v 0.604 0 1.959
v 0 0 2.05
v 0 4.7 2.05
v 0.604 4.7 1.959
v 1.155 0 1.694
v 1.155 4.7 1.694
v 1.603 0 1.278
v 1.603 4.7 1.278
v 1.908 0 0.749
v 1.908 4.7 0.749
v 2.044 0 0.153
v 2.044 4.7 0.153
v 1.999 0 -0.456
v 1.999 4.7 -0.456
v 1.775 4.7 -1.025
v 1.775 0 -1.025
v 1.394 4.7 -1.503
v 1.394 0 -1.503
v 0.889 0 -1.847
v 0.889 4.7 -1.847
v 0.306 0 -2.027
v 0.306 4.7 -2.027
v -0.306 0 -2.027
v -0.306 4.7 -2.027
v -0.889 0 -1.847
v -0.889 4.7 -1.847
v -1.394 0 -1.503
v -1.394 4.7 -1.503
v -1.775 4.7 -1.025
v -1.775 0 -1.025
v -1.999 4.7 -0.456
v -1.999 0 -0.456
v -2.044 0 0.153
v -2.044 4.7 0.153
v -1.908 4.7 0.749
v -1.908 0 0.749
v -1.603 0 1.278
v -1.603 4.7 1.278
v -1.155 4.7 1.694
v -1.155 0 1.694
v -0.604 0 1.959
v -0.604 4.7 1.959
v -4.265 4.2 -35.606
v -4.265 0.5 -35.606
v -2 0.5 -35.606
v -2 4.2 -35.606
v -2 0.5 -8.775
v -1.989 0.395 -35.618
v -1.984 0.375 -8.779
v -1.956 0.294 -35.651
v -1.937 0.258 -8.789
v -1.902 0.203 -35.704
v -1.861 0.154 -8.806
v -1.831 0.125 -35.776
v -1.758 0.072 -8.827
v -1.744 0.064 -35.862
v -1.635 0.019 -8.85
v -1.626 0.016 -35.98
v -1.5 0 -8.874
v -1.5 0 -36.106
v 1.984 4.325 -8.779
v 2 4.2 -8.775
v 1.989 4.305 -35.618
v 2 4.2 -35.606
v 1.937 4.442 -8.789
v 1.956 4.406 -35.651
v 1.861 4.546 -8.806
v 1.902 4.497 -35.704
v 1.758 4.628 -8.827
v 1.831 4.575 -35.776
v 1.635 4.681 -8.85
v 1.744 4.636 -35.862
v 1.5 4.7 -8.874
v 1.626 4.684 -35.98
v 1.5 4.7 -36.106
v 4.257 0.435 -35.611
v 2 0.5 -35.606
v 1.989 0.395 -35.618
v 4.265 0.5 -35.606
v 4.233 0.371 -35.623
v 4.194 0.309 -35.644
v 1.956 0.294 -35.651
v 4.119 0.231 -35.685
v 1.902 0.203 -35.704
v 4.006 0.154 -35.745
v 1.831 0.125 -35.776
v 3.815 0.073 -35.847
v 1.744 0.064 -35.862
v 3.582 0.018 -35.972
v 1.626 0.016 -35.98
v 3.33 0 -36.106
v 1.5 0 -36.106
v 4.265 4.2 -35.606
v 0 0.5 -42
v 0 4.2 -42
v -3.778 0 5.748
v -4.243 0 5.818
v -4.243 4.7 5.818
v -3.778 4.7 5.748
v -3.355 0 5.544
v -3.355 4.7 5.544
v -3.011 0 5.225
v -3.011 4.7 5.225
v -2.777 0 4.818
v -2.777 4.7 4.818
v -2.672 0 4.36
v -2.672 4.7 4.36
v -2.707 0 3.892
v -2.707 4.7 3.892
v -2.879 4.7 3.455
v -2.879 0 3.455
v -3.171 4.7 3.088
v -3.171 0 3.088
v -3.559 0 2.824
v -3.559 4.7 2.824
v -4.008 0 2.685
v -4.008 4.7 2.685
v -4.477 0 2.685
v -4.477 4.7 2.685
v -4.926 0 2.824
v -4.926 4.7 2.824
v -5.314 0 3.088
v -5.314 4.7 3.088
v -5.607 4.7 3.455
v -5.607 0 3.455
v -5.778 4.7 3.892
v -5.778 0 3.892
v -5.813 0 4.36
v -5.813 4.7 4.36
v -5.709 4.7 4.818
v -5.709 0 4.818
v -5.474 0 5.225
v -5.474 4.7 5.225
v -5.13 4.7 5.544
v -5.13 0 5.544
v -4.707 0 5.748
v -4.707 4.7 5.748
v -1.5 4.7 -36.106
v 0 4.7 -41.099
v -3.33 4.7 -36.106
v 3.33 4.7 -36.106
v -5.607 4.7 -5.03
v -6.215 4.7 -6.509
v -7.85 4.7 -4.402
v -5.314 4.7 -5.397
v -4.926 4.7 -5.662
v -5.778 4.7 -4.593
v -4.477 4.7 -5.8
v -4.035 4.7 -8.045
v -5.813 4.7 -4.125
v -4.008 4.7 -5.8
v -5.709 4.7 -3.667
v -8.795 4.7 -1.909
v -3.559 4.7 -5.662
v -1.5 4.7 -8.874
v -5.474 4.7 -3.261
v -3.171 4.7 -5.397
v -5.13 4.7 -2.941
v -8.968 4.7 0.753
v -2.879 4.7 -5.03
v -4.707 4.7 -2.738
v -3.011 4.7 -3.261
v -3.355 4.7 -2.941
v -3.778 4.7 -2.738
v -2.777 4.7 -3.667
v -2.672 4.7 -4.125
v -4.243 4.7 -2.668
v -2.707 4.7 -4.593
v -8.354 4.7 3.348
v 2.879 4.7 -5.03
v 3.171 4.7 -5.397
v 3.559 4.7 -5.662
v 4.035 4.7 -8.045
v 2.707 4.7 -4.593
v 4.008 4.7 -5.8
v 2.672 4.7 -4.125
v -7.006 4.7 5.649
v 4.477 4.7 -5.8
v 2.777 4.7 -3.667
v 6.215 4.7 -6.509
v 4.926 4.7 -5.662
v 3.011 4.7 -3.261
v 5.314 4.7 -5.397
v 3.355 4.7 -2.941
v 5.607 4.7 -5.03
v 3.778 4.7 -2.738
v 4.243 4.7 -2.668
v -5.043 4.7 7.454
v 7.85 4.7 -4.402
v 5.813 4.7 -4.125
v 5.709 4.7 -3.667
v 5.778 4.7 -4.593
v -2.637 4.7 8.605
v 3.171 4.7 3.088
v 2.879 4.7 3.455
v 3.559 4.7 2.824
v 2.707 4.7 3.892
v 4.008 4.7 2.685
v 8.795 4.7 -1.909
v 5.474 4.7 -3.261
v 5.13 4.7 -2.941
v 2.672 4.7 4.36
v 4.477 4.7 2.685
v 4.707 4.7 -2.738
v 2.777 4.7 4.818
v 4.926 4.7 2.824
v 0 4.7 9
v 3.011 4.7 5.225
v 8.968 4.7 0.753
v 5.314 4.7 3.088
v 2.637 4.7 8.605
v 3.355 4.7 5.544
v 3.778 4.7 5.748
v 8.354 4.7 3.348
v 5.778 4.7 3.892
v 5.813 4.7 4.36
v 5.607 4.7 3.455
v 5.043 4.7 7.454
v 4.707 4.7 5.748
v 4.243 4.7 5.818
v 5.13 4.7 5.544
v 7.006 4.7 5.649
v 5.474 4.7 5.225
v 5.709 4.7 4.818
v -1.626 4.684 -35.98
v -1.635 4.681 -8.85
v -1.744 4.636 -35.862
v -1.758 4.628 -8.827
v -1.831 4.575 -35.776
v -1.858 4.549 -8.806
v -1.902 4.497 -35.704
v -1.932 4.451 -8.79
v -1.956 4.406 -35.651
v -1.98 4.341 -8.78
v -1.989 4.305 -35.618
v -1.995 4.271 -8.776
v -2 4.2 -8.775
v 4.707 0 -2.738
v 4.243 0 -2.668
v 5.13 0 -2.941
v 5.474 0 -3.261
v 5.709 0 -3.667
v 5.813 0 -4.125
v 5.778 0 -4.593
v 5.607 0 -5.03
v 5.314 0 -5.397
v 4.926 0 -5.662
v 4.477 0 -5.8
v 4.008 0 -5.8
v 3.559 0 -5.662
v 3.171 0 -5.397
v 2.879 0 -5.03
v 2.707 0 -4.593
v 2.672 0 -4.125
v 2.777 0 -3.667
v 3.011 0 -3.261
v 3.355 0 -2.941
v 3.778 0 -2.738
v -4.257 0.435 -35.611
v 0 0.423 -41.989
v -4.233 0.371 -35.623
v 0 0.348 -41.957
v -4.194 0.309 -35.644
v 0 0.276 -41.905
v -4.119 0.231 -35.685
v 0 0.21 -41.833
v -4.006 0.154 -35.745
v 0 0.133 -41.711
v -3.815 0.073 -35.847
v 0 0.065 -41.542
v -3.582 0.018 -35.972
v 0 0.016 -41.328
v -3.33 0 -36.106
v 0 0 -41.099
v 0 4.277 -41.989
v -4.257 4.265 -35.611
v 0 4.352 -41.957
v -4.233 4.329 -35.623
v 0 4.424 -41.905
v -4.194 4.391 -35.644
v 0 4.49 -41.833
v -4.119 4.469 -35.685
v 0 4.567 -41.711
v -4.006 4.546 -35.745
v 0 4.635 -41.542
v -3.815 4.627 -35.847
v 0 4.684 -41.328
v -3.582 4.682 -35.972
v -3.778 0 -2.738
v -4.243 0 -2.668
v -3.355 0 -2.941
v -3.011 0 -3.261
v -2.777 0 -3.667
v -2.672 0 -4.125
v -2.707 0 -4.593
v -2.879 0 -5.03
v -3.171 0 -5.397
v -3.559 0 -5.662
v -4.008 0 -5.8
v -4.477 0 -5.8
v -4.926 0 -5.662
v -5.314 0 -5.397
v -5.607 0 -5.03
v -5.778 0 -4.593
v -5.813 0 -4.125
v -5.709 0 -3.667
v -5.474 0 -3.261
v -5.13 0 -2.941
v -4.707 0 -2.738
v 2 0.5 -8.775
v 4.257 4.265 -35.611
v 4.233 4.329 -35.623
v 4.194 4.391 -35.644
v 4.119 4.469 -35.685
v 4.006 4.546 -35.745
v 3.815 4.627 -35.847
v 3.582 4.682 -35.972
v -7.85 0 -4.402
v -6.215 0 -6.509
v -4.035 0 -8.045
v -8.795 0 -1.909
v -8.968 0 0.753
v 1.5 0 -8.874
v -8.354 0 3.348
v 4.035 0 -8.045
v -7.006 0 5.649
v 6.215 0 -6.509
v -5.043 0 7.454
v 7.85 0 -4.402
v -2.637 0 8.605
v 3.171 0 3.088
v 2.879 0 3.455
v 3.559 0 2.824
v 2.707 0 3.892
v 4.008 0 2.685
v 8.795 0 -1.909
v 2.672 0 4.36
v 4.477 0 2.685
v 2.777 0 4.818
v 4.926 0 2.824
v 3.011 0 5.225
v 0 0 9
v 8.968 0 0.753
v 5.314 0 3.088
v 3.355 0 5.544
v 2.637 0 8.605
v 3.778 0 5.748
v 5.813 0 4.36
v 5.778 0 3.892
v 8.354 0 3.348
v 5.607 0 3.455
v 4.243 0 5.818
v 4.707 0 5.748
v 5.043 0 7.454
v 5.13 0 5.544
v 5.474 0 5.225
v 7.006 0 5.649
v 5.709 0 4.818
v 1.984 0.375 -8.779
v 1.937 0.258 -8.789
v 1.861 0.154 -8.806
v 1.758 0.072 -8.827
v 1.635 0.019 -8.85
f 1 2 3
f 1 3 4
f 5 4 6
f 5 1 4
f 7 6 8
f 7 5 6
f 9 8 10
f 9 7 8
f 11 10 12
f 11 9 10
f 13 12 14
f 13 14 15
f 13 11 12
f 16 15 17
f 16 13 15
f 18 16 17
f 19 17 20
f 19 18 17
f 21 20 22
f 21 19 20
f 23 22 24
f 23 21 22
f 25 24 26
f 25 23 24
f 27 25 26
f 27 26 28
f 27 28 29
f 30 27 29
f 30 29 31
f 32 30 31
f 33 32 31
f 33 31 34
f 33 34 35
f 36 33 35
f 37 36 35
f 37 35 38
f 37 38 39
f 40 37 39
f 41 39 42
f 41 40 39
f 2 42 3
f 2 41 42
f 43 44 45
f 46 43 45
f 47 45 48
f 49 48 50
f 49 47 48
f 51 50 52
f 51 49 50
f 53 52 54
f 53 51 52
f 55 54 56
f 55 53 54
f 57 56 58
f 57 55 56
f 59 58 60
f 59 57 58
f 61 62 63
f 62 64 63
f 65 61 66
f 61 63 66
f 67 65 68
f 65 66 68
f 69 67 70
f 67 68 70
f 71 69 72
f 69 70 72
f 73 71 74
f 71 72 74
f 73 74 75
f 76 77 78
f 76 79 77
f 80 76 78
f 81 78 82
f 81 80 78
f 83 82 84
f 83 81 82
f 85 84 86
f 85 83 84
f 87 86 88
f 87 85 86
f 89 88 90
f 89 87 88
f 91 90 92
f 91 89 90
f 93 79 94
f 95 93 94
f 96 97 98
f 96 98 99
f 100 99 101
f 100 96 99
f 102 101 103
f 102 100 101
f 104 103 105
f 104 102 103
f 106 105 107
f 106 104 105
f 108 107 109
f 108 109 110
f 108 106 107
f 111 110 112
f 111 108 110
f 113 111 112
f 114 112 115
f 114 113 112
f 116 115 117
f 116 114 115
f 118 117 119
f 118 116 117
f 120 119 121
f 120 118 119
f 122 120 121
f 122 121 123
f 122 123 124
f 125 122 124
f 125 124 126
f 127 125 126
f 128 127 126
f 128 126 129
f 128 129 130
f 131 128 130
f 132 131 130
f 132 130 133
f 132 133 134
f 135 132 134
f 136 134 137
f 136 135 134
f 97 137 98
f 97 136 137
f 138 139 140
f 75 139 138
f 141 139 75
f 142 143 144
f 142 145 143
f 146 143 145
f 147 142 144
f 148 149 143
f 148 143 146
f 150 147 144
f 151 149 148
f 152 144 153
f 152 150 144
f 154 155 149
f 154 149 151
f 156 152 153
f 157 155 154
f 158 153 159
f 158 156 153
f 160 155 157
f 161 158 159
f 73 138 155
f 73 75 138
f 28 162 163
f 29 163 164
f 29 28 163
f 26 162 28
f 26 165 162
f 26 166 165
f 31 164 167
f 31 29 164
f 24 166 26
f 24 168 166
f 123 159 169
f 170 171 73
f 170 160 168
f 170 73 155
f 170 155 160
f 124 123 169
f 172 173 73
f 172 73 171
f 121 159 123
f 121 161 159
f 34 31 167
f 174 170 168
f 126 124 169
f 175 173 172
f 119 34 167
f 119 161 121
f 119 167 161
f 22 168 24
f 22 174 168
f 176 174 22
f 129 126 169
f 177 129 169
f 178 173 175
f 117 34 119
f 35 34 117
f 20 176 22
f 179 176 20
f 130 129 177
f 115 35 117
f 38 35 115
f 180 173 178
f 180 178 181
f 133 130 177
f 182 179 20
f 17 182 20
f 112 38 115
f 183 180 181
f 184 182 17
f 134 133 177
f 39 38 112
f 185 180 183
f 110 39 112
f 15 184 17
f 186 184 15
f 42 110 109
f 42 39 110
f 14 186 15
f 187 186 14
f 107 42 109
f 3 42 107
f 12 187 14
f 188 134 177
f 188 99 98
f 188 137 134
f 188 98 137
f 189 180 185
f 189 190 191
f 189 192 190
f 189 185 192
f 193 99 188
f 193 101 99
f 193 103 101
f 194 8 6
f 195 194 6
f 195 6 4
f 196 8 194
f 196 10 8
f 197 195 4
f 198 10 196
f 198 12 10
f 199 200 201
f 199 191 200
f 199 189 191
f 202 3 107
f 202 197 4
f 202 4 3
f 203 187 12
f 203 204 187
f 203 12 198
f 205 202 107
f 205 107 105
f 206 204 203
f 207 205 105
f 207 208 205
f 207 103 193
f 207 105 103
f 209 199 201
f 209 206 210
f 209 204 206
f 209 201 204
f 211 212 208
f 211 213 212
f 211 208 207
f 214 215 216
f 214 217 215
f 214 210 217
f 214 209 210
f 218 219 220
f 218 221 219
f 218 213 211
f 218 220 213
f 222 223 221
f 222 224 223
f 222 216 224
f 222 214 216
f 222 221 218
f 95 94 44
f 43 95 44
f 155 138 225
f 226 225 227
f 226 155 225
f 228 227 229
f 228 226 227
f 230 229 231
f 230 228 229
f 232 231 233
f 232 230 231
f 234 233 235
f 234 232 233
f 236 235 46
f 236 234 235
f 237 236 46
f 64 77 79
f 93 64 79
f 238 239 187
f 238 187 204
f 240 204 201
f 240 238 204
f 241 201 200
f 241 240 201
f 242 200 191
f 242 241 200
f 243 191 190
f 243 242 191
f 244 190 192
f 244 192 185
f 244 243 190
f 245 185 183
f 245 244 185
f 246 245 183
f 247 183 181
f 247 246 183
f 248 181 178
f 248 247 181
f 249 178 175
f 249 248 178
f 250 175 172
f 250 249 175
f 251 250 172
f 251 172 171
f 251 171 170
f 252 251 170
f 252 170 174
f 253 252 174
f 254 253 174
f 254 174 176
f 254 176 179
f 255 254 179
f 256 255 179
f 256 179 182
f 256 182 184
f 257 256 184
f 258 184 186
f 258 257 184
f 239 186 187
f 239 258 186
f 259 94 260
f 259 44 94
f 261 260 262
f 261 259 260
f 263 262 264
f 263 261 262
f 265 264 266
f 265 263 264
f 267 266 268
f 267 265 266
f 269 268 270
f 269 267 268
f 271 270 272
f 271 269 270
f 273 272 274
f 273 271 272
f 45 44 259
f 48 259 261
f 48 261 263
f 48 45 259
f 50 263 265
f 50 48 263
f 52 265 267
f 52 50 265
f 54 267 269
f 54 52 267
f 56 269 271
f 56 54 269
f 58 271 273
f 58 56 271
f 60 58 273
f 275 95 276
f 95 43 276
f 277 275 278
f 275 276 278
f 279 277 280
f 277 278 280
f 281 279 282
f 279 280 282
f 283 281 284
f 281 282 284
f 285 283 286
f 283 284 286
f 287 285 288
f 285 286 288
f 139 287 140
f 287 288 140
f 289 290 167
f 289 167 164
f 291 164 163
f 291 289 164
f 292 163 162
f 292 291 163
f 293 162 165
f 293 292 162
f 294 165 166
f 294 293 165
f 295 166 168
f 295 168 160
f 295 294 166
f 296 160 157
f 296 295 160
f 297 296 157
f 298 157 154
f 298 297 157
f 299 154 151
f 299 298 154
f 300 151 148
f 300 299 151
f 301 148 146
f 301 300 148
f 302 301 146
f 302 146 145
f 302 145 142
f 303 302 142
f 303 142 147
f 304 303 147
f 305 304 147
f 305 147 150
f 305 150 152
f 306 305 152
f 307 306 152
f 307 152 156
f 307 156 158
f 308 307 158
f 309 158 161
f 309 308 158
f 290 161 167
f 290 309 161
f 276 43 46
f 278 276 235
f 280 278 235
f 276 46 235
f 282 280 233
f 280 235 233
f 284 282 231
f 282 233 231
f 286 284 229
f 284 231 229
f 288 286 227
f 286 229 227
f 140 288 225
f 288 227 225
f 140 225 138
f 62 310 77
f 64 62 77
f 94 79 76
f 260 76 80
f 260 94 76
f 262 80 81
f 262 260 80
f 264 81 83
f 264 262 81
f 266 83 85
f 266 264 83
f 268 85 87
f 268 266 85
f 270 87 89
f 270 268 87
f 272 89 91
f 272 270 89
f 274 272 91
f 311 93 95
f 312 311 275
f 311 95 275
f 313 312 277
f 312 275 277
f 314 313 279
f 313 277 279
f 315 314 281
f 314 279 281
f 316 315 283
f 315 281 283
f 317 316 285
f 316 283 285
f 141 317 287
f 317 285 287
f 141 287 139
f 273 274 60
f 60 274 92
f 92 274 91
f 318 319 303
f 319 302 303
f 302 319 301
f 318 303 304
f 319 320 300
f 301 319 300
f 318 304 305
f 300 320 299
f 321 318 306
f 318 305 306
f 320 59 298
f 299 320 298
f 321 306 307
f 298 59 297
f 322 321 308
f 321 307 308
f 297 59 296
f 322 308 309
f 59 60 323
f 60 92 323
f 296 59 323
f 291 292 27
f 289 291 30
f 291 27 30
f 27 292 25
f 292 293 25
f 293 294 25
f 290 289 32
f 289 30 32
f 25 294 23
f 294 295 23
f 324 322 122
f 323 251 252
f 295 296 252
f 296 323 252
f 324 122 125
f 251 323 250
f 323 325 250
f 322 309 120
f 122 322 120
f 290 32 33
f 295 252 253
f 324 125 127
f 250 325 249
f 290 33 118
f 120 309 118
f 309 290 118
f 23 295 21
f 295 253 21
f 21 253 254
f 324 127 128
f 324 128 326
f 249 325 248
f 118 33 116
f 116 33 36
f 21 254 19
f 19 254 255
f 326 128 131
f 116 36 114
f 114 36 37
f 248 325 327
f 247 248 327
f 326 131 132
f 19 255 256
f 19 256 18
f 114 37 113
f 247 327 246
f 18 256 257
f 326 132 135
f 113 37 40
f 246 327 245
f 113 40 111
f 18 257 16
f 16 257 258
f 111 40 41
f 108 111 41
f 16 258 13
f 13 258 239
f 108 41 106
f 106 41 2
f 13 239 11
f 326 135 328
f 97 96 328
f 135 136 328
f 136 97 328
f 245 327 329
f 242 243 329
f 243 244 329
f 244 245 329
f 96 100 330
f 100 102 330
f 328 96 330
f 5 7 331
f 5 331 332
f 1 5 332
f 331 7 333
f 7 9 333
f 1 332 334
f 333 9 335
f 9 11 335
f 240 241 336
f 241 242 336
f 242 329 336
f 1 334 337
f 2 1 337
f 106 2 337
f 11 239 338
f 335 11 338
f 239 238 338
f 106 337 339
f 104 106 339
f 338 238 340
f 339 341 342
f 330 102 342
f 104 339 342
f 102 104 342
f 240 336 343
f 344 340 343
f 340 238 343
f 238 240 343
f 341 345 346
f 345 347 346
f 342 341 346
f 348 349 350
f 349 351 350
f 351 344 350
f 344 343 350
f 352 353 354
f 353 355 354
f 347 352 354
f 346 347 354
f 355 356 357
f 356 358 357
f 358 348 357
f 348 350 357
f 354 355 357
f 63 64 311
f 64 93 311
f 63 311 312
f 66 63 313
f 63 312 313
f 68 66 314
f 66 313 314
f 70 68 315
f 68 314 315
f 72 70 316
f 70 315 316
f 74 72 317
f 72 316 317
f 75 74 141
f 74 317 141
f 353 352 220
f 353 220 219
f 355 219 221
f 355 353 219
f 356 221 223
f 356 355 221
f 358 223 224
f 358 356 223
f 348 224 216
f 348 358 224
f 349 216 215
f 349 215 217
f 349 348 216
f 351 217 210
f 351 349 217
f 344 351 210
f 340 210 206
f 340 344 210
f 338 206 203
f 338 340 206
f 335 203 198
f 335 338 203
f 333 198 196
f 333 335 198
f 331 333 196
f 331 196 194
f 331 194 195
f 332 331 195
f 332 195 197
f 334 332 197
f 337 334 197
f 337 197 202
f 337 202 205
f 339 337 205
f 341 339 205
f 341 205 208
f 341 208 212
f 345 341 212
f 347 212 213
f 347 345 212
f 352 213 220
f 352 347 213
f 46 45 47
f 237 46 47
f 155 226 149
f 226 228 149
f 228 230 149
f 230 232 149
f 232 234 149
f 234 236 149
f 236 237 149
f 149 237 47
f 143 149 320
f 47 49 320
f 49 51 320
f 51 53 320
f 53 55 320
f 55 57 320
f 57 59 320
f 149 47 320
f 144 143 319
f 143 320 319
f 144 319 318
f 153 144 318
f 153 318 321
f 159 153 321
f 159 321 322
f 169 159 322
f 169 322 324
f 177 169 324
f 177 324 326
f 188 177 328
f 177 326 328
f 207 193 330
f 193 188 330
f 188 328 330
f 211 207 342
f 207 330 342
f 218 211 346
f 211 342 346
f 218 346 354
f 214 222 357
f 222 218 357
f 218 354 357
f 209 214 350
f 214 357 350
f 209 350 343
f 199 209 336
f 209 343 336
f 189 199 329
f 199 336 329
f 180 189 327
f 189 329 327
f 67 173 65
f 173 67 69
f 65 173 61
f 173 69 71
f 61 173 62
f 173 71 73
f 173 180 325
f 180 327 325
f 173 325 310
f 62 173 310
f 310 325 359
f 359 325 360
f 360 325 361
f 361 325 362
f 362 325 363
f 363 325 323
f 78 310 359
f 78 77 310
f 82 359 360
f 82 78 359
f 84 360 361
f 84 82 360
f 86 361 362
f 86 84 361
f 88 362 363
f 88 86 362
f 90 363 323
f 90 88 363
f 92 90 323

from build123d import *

# Parameters (mm, degrees)
SKETCH2_R           = 9
SKETCH2_R_2         = 2.05
SKETCH2_R_3         = 1.575
BOSS_EXTRUDE2_DEPTH = 4.7
BOSS_EXTRUDE3_START = -4.7
BOSS_EXTRUDE3_DEPTH = 4.7
FILLET1_R           = 0.5


with BuildPart() as part:
    # Sketch2 → Boss-Extrude2 (new body)
    with BuildSketch(Plane(origin=(0, 0, 0), x_dir=(1, 0, 0), z_dir=(0, 1, 0))):
        with Locations(Location((0, 0, 0), (0, 0, 270))):
            Circle(SKETCH2_R)
        with Locations(Location((0, 0, 0), (0, 0, 270))):
            Circle(SKETCH2_R_2, mode=Mode.SUBTRACT)
        with Locations(Location((-4.242640687, 4.242640687, 0), (0, 0, 270))):
            Circle(SKETCH2_R_3, mode=Mode.SUBTRACT)
        with Locations(Location((-4.242640687, -4.242640687, 0), (0, 0, 270))):
            Circle(SKETCH2_R_3, mode=Mode.SUBTRACT)
        with Locations(Location((4.242640687, -4.242640687, 0), (0, 0, 270))):
            Circle(SKETCH2_R_3, mode=Mode.SUBTRACT)
        with Locations(Location((4.242640687, 4.242640687, 0), (0, 0, 270))):
            Circle(SKETCH2_R_3, mode=Mode.SUBTRACT)
    extrude(amount=BOSS_EXTRUDE2_DEPTH)

    # Sketch3 → Boss-Extrude3 (add)
    with BuildSketch(Plane(origin=(0, 4.7, 0), x_dir=(1, 0, 0), z_dir=(0, 1, 0)).offset(BOSS_EXTRUDE3_START)):
        with BuildLine():
            Line((-2, 35.606375805), (-2, 8.774964387))
            ThreePointArc((-2, 8.774964387), (0, 9), (2, 8.774964387))
            Line((2, 8.774964387), (2, 35.606375805))
            Line((2, 35.606375805), (4.264997114, 35.606375805))
            Line((4.264997114, 35.606375805), (0, 42))
            Line((0, 42), (-4.264997114, 35.606375805))
            Line((-4.264997114, 35.606375805), (-2, 35.606375805))
        make_face()
    extrude(amount=BOSS_EXTRUDE3_DEPTH)

    # Fillet1
    fillet1_edges = [part.edges().sort_by_distance(p)[0] for p in [
        (-3.132498557, 4.7, -35.606375805),
        (-2, 4.7, -22.190670096),
        (2, 4.7, -22.190670096),
        (3.132498557, 4.7, -35.606375805),
        (2.132498557, 4.7, -38.803187903),
        (-2.132498557, 4.7, -38.803187903),
        (-3.132498557, 0, -35.606375805),
        (-2.132498557, 0, -38.803187903),
        (2.132498557, 0, -38.803187903),
        (3.132498557, 0, -35.606375805),
        (2, 0, -22.190670096),
        (-2, 0, -22.190670096),
    ]]
    fillet(fillet1_edges, radius=FILLET1_R)


solid = part.part
